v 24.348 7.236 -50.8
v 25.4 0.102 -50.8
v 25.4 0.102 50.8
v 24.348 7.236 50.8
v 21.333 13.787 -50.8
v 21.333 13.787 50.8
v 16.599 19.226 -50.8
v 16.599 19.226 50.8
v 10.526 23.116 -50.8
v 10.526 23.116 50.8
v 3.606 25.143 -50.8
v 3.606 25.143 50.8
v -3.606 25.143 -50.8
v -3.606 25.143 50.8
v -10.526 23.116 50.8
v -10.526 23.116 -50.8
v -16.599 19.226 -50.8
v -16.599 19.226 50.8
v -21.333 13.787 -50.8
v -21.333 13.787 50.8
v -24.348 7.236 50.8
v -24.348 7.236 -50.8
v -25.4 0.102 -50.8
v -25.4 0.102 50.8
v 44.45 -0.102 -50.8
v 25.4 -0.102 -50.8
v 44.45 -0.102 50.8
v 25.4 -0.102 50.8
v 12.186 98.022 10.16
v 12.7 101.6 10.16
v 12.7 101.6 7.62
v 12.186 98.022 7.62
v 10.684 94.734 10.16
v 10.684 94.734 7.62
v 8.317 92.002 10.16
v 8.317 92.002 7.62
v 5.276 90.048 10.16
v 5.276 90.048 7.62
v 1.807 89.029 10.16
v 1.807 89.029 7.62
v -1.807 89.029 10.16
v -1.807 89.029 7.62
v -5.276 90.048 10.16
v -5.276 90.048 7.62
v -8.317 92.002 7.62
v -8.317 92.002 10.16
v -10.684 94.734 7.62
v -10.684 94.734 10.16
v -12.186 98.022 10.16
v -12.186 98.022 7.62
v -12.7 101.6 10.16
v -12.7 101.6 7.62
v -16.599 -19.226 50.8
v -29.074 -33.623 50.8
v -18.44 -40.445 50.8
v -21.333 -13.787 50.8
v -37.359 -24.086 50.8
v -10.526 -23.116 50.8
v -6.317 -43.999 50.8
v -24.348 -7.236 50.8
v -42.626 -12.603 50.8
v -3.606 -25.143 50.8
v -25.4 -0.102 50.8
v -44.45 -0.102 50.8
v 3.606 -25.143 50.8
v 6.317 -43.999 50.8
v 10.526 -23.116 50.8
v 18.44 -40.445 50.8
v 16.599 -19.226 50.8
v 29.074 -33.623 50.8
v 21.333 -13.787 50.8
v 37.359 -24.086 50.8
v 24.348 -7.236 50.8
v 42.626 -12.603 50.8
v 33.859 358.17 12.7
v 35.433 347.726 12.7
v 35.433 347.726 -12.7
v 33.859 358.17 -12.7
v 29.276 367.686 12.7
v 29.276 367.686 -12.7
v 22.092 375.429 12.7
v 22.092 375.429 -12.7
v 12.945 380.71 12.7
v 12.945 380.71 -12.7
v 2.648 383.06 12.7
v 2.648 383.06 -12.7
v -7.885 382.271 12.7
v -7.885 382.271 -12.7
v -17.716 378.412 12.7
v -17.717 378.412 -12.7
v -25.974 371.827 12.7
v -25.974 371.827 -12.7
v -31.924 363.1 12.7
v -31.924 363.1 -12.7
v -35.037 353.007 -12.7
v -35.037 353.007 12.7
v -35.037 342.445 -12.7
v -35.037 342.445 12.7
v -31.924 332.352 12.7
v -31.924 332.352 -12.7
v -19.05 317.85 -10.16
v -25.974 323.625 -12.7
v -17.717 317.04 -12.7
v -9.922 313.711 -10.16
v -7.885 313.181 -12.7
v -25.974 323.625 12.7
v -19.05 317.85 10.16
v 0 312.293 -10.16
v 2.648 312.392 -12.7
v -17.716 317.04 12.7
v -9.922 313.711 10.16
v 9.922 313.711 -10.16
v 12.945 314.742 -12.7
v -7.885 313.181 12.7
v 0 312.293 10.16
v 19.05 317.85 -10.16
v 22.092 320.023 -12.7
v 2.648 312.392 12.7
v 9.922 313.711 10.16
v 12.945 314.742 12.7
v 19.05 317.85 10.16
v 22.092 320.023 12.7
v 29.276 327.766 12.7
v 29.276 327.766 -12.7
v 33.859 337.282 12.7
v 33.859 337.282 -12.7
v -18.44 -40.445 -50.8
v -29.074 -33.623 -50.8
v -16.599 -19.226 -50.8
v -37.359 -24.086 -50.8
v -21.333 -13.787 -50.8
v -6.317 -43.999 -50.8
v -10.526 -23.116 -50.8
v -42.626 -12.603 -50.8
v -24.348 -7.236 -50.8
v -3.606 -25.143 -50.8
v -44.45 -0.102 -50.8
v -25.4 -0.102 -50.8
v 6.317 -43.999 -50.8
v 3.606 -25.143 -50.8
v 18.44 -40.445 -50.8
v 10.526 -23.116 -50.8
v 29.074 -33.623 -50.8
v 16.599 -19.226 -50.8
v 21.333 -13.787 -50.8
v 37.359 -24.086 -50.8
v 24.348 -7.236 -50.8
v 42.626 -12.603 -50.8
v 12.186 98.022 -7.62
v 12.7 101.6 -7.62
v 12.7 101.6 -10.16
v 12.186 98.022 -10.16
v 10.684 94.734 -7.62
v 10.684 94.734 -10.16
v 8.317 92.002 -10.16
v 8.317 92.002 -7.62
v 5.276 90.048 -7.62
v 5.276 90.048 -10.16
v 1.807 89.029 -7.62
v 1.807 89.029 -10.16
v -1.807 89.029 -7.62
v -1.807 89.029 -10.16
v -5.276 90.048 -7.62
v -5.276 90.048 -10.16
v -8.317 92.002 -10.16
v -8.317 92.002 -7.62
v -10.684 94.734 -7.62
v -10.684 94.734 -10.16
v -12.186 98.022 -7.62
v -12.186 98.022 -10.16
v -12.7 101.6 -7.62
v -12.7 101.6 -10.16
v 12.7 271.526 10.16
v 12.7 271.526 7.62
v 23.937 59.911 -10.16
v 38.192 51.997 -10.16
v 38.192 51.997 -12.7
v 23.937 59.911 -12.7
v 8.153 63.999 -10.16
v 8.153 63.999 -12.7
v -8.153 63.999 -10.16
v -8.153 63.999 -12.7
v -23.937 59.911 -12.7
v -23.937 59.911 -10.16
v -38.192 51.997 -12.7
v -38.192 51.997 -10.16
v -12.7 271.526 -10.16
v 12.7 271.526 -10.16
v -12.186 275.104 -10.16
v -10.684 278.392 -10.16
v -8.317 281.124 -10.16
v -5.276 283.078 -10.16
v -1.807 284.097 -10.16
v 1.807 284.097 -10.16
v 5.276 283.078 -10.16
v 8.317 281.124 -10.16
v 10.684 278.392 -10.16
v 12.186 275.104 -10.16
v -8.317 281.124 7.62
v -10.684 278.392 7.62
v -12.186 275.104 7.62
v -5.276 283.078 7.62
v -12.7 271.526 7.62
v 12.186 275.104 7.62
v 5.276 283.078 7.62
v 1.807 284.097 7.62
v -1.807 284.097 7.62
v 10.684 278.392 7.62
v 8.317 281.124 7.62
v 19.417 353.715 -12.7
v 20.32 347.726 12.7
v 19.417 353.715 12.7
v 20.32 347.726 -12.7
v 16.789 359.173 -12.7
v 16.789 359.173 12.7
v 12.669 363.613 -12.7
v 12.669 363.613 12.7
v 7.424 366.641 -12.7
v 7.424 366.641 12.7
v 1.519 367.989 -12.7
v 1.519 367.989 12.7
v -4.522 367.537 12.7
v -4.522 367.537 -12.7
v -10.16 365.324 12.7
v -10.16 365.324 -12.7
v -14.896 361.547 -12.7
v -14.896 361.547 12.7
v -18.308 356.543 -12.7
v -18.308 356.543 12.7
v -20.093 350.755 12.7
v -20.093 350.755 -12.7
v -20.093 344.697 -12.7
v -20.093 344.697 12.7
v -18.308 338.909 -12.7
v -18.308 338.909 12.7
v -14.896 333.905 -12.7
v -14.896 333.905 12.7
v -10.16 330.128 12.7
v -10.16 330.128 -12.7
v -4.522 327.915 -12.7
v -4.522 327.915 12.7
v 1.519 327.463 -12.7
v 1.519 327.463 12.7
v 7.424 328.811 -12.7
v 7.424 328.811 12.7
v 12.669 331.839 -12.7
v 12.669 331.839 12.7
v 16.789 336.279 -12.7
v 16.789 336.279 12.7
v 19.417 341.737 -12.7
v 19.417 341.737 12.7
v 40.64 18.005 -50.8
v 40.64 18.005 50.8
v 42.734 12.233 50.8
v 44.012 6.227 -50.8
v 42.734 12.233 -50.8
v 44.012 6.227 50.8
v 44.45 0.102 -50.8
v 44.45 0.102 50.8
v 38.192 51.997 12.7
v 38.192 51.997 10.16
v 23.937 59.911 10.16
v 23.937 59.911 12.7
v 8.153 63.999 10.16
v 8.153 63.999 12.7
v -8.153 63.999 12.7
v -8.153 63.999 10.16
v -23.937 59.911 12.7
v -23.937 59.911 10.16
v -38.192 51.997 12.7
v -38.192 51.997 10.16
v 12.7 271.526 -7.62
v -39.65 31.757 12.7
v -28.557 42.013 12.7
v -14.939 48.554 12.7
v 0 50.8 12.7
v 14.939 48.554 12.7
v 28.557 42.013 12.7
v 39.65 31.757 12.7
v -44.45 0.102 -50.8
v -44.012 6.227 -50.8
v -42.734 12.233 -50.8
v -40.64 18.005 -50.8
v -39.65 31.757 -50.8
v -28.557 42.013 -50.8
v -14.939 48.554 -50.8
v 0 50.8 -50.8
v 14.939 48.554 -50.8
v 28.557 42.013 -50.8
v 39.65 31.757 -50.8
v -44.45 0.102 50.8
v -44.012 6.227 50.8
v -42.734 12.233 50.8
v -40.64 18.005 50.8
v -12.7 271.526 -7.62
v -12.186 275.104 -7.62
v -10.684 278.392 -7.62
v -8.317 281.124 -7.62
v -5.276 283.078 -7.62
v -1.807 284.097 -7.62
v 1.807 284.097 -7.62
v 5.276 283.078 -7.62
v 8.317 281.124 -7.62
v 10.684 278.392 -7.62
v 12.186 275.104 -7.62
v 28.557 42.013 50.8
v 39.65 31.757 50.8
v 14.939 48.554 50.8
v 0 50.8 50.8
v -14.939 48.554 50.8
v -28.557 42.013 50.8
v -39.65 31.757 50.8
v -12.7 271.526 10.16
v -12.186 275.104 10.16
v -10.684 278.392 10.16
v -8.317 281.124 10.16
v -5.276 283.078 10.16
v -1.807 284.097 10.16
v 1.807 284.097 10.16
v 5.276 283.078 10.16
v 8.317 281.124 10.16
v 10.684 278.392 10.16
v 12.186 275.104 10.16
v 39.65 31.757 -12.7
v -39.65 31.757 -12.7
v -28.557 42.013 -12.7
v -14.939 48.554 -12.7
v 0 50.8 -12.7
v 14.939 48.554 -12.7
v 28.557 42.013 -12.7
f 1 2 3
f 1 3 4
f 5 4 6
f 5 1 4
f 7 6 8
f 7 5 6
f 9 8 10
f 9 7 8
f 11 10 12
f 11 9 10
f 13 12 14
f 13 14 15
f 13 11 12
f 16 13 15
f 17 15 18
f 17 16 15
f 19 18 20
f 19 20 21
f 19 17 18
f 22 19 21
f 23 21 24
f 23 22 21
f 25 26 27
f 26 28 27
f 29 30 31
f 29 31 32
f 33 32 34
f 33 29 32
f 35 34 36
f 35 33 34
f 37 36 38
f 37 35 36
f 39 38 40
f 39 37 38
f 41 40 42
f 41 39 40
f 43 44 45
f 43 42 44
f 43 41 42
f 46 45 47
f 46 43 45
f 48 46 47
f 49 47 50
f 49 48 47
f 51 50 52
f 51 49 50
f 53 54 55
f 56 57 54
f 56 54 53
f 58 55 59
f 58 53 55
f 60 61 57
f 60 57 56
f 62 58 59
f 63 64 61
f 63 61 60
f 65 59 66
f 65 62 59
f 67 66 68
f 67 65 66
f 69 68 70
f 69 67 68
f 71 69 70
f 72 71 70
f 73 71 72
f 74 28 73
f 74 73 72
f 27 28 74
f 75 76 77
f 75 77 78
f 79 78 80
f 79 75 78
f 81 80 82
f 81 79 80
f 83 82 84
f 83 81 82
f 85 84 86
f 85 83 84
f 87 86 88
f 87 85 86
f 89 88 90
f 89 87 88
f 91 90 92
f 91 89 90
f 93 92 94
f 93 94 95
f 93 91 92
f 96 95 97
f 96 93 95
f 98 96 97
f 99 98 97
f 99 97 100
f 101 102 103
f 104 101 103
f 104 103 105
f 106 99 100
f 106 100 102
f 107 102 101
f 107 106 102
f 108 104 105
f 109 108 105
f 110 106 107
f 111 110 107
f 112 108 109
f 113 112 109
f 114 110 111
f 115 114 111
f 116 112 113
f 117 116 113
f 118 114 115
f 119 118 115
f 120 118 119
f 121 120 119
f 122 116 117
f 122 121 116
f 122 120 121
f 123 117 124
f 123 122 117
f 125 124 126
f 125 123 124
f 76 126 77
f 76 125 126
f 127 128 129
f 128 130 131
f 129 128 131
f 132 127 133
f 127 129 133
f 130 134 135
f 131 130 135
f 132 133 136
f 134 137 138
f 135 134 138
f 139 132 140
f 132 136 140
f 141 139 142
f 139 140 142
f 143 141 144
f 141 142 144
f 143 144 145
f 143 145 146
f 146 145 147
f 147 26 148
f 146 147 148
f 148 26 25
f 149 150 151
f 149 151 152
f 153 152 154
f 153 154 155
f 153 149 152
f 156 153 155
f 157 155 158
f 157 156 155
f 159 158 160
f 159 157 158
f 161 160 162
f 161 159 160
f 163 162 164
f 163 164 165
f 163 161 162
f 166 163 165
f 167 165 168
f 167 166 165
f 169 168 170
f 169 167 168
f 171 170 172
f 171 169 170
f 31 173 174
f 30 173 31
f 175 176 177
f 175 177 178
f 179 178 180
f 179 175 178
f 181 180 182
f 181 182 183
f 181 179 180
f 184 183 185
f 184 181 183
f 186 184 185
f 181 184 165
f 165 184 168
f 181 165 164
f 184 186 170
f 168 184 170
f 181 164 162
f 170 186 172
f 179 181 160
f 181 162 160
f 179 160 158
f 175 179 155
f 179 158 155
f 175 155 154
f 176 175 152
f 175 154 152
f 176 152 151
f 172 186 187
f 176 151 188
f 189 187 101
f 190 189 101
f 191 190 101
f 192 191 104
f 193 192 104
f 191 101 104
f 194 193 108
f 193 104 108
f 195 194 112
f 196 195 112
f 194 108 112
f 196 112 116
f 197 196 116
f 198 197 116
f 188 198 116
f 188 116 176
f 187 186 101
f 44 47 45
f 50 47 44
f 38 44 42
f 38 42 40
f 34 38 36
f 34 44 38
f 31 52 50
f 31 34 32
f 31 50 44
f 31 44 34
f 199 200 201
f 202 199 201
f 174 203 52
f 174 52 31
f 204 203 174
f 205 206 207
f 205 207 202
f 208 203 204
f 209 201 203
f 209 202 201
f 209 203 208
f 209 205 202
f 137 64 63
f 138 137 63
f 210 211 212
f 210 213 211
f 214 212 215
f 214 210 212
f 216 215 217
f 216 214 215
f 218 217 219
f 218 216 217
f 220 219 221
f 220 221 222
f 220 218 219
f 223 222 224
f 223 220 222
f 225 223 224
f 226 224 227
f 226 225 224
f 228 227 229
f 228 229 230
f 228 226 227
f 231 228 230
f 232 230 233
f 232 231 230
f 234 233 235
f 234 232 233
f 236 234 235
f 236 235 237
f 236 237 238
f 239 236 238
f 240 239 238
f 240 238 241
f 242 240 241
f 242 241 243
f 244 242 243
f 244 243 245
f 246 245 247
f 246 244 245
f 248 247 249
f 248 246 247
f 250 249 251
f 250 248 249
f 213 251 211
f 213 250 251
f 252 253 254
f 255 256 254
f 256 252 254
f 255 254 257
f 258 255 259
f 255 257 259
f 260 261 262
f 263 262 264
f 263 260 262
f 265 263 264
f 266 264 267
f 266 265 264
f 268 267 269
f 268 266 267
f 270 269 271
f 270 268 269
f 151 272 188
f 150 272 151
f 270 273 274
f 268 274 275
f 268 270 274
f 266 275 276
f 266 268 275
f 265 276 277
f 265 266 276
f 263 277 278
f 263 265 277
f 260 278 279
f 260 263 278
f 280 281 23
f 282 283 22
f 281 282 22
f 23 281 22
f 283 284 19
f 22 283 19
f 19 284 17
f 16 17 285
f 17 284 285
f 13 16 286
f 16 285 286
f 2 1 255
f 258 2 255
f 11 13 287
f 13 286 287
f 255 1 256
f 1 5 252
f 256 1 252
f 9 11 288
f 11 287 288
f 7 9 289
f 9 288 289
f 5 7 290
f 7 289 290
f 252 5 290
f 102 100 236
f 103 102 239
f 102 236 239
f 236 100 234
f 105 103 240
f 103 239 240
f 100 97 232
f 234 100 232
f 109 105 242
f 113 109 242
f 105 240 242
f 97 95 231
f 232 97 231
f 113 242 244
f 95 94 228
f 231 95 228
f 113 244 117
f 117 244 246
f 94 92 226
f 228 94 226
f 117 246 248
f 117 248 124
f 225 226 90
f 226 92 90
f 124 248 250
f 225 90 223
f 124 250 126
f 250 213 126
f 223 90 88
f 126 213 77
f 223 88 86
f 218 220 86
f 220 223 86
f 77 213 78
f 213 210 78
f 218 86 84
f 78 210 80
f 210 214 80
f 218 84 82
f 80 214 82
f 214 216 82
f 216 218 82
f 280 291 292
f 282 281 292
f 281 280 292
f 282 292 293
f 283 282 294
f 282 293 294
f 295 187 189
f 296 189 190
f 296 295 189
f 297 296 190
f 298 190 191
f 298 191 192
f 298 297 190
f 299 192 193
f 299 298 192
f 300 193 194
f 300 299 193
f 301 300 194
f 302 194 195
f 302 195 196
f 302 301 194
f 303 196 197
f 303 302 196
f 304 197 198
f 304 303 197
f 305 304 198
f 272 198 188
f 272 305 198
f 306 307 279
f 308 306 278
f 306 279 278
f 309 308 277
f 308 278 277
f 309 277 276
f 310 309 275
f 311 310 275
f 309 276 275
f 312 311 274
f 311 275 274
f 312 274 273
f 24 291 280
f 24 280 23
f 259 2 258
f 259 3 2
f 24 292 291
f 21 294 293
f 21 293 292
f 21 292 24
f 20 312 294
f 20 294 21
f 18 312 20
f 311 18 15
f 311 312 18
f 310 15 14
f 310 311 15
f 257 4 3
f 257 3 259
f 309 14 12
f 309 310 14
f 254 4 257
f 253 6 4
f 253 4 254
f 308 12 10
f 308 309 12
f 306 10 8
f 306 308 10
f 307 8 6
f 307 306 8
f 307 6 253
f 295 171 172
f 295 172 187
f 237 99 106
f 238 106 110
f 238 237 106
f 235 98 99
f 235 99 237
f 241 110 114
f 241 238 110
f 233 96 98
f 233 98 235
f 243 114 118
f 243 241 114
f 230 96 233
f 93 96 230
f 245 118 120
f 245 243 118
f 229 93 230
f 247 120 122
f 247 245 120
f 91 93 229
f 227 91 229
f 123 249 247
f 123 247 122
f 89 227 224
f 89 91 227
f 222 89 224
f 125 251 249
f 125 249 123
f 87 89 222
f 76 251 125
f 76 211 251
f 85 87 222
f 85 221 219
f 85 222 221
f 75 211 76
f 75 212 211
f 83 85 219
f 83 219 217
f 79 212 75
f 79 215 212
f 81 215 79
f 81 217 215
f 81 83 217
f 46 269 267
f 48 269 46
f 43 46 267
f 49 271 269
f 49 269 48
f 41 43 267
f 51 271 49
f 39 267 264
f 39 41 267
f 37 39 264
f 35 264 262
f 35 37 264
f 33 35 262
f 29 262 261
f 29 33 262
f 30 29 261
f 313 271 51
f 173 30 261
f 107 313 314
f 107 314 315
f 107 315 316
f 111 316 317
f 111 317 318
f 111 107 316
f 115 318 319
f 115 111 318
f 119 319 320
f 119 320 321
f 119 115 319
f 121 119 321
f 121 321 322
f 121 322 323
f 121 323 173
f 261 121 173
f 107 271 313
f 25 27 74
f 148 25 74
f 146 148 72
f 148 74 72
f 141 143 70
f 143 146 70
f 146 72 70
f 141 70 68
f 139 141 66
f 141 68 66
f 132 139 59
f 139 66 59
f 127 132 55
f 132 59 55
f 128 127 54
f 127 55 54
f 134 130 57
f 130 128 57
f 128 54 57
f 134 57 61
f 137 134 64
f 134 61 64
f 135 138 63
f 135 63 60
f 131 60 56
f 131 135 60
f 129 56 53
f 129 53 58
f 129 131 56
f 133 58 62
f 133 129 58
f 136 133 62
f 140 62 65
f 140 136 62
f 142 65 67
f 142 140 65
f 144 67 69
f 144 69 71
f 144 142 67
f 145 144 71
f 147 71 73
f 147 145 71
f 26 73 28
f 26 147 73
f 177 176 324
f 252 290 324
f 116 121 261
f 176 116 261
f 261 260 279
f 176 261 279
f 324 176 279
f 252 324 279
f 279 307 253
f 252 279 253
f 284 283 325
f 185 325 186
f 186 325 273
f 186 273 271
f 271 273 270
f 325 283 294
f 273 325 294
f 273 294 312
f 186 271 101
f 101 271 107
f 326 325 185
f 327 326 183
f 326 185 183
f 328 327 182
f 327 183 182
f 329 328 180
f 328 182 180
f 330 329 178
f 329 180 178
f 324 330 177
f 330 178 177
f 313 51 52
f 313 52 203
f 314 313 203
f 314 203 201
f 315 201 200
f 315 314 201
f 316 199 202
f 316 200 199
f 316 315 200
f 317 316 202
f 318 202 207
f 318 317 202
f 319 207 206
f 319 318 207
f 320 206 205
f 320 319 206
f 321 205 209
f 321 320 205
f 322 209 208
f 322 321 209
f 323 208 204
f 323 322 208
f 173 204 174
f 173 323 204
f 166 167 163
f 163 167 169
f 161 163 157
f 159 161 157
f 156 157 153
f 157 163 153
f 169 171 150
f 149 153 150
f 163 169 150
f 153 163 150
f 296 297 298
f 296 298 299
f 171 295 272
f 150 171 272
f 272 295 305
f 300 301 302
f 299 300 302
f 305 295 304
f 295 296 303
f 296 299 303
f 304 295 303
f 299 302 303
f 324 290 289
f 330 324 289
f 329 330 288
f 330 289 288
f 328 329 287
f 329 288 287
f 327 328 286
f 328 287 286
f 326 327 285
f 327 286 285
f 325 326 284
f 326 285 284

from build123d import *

# Parameters (mm, degrees)
SKETCH1_R                = 35.433
SKETCH1_R_2              = 20.32
BOSS_EXTRUDE1_DEPTH      = 12.7
SKETCH1_R_3              = 64.516
SKETCH1_R_4              = 25.4
BOSS_EXTRUDE1_2_DEPTH    = 12.7
BOSS_EXTRUDE2_DEPTH      = 10.16
BOSS_EXTRUDE3_DEPTH      = 7.62
BOSS_EXTRUDE4_DEPTH      = 38.1
BOSS_EXTRUDE4_DEPTH_BACK = 63.5
SKETCH2_R                = 50.8
SKETCH2_R_2              = 25.4
CUT_EXTRUDE1_DEPTH       = 81.28
SKETCH4_W                = 436.529729861
SKETCH4_H                = 0.2032
CUT_EXTRUDE2_DEPTH       = 81.28


with BuildPart() as part:
    # Sketch1 → Boss-Extrude1 (new, symmetric)
    with BuildSketch(Plane.XY):
        with Locations((0, 347.726)):
            Circle(SKETCH1_R)
        with Locations((0, 347.726)):
            Circle(SKETCH1_R_2, mode=Mode.SUBTRACT)
    extrude(amount=BOSS_EXTRUDE1_DEPTH, both=True)



with BuildPart() as body_2:
    # Sketch1 → Boss-Extrude1 2 (new, symmetric)
    with BuildSketch(Plane.XY):
        Circle(SKETCH1_R_3)
        Circle(SKETCH1_R_4, mode=Mode.SUBTRACT)
    extrude(amount=BOSS_EXTRUDE1_2_DEPTH, both=True)


with BuildPart() as part_1:
    add(part.part)

    add(body_2.part)  # Boss-Extrude2 merges body 2
    # Sketch1<3> → Boss-Extrude2 (add, symmetric)
    with BuildSketch(Plane.XY):
        with BuildLine():
            ThreePointArc((19.05, 317.849671762), (0, 312.293), (-19.05, 317.849671762))
            Line((-19.05, 317.849671762), (-41.91, 49.049629519))
            ThreePointArc((-41.91, 49.049629519), (0, 64.516), (41.91, 49.049629519))
            Line((41.91, 49.049629519), (19.05, 317.849671762))
        make_face()
        with BuildLine():
            ThreePointArc((-12.7, 271.526), (0, 284.226), (12.7, 271.526))
            Line((12.7, 271.526), (12.7, 101.6))
            ThreePointArc((12.7, 101.6), (0, 88.9), (-12.7, 101.6))
            Line((-12.7, 101.6), (-12.7, 271.526))
        make_face(mode=Mode.SUBTRACT)
    extrude(amount=BOSS_EXTRUDE2_DEPTH, both=True)

    # Sketch1<4> → Boss-Extrude3 (add, symmetric)
    with BuildSketch(Plane.XY):
        with BuildLine():
            Line((-12.7, 271.526), (-12.7, 101.6))
            ThreePointArc((-12.7, 101.6), (0, 88.9), (12.7, 101.6))
            Line((12.7, 101.6), (12.7, 271.526))
            ThreePointArc((12.7, 271.526), (0, 284.226), (-12.7, 271.526))
        make_face()
    extrude(amount=BOSS_EXTRUDE3_DEPTH, both=True)

    # Sketch2 → Boss-Extrude4 (add, two sides: drawn at the far end of the back side and taken through both)
    with BuildSketch(Plane.XY.offset(12.7).offset(-BOSS_EXTRUDE4_DEPTH_BACK)):
        Circle(SKETCH2_R)
        Circle(SKETCH2_R_2, mode=Mode.SUBTRACT)
    extrude(amount=BOSS_EXTRUDE4_DEPTH + BOSS_EXTRUDE4_DEPTH_BACK)

    # Sketch3 → Cut-Extrude1 (cut, symmetric)
    with BuildSketch(Plane.XY):
        with BuildLine():
            Line((-19.05, 317.849671762), (-70.876957171, 53.662528287))
            ThreePointArc((-70.876957171, 53.662528287), (0, -88.9), (70.876957171, 53.662528287))
            Line((70.876957171, 53.662528287), (19.05, 317.849671762))
            Line((19.05, 317.849671762), (40.64, 18.005357536))
            ThreePointArc((40.64, 18.005357536), (0, -44.45), (-40.64, 18.005357536))
            Line((-40.64, 18.005357536), (-19.05, 317.849671762))
        make_face()
    extrude(amount=CUT_EXTRUDE1_DEPTH, both=True, mode=Mode.SUBTRACT)

    # Sketch4 → Cut-Extrude2 (cut, symmetric)
    with BuildSketch(Plane.XY):
        with Locations((139.606166591, 0)):
            Rectangle(SKETCH4_W, SKETCH4_H)
    extrude(amount=CUT_EXTRUDE2_DEPTH, both=True, mode=Mode.SUBTRACT)


with BuildPart() as cut_extrude2_piece_1:
    # of the separate pieces the step leaves, piece 1, a body of its own (cut_extrude2_pieces)
    add(part_1.part.solids().sort_by_distance((38.192492502, 51.996613087, -12.7))[0])


with BuildPart() as cut_extrude2_piece_2:
    # of the separate pieces the step leaves, piece 2, a body of its own (cut_extrude2_pieces)
    add(part_1.part.solids().sort_by_distance((-44.449883886, -0.1016, -50.8))[0])


solid = Compound([cut_extrude2_piece_1.part, cut_extrude2_piece_2.part])
